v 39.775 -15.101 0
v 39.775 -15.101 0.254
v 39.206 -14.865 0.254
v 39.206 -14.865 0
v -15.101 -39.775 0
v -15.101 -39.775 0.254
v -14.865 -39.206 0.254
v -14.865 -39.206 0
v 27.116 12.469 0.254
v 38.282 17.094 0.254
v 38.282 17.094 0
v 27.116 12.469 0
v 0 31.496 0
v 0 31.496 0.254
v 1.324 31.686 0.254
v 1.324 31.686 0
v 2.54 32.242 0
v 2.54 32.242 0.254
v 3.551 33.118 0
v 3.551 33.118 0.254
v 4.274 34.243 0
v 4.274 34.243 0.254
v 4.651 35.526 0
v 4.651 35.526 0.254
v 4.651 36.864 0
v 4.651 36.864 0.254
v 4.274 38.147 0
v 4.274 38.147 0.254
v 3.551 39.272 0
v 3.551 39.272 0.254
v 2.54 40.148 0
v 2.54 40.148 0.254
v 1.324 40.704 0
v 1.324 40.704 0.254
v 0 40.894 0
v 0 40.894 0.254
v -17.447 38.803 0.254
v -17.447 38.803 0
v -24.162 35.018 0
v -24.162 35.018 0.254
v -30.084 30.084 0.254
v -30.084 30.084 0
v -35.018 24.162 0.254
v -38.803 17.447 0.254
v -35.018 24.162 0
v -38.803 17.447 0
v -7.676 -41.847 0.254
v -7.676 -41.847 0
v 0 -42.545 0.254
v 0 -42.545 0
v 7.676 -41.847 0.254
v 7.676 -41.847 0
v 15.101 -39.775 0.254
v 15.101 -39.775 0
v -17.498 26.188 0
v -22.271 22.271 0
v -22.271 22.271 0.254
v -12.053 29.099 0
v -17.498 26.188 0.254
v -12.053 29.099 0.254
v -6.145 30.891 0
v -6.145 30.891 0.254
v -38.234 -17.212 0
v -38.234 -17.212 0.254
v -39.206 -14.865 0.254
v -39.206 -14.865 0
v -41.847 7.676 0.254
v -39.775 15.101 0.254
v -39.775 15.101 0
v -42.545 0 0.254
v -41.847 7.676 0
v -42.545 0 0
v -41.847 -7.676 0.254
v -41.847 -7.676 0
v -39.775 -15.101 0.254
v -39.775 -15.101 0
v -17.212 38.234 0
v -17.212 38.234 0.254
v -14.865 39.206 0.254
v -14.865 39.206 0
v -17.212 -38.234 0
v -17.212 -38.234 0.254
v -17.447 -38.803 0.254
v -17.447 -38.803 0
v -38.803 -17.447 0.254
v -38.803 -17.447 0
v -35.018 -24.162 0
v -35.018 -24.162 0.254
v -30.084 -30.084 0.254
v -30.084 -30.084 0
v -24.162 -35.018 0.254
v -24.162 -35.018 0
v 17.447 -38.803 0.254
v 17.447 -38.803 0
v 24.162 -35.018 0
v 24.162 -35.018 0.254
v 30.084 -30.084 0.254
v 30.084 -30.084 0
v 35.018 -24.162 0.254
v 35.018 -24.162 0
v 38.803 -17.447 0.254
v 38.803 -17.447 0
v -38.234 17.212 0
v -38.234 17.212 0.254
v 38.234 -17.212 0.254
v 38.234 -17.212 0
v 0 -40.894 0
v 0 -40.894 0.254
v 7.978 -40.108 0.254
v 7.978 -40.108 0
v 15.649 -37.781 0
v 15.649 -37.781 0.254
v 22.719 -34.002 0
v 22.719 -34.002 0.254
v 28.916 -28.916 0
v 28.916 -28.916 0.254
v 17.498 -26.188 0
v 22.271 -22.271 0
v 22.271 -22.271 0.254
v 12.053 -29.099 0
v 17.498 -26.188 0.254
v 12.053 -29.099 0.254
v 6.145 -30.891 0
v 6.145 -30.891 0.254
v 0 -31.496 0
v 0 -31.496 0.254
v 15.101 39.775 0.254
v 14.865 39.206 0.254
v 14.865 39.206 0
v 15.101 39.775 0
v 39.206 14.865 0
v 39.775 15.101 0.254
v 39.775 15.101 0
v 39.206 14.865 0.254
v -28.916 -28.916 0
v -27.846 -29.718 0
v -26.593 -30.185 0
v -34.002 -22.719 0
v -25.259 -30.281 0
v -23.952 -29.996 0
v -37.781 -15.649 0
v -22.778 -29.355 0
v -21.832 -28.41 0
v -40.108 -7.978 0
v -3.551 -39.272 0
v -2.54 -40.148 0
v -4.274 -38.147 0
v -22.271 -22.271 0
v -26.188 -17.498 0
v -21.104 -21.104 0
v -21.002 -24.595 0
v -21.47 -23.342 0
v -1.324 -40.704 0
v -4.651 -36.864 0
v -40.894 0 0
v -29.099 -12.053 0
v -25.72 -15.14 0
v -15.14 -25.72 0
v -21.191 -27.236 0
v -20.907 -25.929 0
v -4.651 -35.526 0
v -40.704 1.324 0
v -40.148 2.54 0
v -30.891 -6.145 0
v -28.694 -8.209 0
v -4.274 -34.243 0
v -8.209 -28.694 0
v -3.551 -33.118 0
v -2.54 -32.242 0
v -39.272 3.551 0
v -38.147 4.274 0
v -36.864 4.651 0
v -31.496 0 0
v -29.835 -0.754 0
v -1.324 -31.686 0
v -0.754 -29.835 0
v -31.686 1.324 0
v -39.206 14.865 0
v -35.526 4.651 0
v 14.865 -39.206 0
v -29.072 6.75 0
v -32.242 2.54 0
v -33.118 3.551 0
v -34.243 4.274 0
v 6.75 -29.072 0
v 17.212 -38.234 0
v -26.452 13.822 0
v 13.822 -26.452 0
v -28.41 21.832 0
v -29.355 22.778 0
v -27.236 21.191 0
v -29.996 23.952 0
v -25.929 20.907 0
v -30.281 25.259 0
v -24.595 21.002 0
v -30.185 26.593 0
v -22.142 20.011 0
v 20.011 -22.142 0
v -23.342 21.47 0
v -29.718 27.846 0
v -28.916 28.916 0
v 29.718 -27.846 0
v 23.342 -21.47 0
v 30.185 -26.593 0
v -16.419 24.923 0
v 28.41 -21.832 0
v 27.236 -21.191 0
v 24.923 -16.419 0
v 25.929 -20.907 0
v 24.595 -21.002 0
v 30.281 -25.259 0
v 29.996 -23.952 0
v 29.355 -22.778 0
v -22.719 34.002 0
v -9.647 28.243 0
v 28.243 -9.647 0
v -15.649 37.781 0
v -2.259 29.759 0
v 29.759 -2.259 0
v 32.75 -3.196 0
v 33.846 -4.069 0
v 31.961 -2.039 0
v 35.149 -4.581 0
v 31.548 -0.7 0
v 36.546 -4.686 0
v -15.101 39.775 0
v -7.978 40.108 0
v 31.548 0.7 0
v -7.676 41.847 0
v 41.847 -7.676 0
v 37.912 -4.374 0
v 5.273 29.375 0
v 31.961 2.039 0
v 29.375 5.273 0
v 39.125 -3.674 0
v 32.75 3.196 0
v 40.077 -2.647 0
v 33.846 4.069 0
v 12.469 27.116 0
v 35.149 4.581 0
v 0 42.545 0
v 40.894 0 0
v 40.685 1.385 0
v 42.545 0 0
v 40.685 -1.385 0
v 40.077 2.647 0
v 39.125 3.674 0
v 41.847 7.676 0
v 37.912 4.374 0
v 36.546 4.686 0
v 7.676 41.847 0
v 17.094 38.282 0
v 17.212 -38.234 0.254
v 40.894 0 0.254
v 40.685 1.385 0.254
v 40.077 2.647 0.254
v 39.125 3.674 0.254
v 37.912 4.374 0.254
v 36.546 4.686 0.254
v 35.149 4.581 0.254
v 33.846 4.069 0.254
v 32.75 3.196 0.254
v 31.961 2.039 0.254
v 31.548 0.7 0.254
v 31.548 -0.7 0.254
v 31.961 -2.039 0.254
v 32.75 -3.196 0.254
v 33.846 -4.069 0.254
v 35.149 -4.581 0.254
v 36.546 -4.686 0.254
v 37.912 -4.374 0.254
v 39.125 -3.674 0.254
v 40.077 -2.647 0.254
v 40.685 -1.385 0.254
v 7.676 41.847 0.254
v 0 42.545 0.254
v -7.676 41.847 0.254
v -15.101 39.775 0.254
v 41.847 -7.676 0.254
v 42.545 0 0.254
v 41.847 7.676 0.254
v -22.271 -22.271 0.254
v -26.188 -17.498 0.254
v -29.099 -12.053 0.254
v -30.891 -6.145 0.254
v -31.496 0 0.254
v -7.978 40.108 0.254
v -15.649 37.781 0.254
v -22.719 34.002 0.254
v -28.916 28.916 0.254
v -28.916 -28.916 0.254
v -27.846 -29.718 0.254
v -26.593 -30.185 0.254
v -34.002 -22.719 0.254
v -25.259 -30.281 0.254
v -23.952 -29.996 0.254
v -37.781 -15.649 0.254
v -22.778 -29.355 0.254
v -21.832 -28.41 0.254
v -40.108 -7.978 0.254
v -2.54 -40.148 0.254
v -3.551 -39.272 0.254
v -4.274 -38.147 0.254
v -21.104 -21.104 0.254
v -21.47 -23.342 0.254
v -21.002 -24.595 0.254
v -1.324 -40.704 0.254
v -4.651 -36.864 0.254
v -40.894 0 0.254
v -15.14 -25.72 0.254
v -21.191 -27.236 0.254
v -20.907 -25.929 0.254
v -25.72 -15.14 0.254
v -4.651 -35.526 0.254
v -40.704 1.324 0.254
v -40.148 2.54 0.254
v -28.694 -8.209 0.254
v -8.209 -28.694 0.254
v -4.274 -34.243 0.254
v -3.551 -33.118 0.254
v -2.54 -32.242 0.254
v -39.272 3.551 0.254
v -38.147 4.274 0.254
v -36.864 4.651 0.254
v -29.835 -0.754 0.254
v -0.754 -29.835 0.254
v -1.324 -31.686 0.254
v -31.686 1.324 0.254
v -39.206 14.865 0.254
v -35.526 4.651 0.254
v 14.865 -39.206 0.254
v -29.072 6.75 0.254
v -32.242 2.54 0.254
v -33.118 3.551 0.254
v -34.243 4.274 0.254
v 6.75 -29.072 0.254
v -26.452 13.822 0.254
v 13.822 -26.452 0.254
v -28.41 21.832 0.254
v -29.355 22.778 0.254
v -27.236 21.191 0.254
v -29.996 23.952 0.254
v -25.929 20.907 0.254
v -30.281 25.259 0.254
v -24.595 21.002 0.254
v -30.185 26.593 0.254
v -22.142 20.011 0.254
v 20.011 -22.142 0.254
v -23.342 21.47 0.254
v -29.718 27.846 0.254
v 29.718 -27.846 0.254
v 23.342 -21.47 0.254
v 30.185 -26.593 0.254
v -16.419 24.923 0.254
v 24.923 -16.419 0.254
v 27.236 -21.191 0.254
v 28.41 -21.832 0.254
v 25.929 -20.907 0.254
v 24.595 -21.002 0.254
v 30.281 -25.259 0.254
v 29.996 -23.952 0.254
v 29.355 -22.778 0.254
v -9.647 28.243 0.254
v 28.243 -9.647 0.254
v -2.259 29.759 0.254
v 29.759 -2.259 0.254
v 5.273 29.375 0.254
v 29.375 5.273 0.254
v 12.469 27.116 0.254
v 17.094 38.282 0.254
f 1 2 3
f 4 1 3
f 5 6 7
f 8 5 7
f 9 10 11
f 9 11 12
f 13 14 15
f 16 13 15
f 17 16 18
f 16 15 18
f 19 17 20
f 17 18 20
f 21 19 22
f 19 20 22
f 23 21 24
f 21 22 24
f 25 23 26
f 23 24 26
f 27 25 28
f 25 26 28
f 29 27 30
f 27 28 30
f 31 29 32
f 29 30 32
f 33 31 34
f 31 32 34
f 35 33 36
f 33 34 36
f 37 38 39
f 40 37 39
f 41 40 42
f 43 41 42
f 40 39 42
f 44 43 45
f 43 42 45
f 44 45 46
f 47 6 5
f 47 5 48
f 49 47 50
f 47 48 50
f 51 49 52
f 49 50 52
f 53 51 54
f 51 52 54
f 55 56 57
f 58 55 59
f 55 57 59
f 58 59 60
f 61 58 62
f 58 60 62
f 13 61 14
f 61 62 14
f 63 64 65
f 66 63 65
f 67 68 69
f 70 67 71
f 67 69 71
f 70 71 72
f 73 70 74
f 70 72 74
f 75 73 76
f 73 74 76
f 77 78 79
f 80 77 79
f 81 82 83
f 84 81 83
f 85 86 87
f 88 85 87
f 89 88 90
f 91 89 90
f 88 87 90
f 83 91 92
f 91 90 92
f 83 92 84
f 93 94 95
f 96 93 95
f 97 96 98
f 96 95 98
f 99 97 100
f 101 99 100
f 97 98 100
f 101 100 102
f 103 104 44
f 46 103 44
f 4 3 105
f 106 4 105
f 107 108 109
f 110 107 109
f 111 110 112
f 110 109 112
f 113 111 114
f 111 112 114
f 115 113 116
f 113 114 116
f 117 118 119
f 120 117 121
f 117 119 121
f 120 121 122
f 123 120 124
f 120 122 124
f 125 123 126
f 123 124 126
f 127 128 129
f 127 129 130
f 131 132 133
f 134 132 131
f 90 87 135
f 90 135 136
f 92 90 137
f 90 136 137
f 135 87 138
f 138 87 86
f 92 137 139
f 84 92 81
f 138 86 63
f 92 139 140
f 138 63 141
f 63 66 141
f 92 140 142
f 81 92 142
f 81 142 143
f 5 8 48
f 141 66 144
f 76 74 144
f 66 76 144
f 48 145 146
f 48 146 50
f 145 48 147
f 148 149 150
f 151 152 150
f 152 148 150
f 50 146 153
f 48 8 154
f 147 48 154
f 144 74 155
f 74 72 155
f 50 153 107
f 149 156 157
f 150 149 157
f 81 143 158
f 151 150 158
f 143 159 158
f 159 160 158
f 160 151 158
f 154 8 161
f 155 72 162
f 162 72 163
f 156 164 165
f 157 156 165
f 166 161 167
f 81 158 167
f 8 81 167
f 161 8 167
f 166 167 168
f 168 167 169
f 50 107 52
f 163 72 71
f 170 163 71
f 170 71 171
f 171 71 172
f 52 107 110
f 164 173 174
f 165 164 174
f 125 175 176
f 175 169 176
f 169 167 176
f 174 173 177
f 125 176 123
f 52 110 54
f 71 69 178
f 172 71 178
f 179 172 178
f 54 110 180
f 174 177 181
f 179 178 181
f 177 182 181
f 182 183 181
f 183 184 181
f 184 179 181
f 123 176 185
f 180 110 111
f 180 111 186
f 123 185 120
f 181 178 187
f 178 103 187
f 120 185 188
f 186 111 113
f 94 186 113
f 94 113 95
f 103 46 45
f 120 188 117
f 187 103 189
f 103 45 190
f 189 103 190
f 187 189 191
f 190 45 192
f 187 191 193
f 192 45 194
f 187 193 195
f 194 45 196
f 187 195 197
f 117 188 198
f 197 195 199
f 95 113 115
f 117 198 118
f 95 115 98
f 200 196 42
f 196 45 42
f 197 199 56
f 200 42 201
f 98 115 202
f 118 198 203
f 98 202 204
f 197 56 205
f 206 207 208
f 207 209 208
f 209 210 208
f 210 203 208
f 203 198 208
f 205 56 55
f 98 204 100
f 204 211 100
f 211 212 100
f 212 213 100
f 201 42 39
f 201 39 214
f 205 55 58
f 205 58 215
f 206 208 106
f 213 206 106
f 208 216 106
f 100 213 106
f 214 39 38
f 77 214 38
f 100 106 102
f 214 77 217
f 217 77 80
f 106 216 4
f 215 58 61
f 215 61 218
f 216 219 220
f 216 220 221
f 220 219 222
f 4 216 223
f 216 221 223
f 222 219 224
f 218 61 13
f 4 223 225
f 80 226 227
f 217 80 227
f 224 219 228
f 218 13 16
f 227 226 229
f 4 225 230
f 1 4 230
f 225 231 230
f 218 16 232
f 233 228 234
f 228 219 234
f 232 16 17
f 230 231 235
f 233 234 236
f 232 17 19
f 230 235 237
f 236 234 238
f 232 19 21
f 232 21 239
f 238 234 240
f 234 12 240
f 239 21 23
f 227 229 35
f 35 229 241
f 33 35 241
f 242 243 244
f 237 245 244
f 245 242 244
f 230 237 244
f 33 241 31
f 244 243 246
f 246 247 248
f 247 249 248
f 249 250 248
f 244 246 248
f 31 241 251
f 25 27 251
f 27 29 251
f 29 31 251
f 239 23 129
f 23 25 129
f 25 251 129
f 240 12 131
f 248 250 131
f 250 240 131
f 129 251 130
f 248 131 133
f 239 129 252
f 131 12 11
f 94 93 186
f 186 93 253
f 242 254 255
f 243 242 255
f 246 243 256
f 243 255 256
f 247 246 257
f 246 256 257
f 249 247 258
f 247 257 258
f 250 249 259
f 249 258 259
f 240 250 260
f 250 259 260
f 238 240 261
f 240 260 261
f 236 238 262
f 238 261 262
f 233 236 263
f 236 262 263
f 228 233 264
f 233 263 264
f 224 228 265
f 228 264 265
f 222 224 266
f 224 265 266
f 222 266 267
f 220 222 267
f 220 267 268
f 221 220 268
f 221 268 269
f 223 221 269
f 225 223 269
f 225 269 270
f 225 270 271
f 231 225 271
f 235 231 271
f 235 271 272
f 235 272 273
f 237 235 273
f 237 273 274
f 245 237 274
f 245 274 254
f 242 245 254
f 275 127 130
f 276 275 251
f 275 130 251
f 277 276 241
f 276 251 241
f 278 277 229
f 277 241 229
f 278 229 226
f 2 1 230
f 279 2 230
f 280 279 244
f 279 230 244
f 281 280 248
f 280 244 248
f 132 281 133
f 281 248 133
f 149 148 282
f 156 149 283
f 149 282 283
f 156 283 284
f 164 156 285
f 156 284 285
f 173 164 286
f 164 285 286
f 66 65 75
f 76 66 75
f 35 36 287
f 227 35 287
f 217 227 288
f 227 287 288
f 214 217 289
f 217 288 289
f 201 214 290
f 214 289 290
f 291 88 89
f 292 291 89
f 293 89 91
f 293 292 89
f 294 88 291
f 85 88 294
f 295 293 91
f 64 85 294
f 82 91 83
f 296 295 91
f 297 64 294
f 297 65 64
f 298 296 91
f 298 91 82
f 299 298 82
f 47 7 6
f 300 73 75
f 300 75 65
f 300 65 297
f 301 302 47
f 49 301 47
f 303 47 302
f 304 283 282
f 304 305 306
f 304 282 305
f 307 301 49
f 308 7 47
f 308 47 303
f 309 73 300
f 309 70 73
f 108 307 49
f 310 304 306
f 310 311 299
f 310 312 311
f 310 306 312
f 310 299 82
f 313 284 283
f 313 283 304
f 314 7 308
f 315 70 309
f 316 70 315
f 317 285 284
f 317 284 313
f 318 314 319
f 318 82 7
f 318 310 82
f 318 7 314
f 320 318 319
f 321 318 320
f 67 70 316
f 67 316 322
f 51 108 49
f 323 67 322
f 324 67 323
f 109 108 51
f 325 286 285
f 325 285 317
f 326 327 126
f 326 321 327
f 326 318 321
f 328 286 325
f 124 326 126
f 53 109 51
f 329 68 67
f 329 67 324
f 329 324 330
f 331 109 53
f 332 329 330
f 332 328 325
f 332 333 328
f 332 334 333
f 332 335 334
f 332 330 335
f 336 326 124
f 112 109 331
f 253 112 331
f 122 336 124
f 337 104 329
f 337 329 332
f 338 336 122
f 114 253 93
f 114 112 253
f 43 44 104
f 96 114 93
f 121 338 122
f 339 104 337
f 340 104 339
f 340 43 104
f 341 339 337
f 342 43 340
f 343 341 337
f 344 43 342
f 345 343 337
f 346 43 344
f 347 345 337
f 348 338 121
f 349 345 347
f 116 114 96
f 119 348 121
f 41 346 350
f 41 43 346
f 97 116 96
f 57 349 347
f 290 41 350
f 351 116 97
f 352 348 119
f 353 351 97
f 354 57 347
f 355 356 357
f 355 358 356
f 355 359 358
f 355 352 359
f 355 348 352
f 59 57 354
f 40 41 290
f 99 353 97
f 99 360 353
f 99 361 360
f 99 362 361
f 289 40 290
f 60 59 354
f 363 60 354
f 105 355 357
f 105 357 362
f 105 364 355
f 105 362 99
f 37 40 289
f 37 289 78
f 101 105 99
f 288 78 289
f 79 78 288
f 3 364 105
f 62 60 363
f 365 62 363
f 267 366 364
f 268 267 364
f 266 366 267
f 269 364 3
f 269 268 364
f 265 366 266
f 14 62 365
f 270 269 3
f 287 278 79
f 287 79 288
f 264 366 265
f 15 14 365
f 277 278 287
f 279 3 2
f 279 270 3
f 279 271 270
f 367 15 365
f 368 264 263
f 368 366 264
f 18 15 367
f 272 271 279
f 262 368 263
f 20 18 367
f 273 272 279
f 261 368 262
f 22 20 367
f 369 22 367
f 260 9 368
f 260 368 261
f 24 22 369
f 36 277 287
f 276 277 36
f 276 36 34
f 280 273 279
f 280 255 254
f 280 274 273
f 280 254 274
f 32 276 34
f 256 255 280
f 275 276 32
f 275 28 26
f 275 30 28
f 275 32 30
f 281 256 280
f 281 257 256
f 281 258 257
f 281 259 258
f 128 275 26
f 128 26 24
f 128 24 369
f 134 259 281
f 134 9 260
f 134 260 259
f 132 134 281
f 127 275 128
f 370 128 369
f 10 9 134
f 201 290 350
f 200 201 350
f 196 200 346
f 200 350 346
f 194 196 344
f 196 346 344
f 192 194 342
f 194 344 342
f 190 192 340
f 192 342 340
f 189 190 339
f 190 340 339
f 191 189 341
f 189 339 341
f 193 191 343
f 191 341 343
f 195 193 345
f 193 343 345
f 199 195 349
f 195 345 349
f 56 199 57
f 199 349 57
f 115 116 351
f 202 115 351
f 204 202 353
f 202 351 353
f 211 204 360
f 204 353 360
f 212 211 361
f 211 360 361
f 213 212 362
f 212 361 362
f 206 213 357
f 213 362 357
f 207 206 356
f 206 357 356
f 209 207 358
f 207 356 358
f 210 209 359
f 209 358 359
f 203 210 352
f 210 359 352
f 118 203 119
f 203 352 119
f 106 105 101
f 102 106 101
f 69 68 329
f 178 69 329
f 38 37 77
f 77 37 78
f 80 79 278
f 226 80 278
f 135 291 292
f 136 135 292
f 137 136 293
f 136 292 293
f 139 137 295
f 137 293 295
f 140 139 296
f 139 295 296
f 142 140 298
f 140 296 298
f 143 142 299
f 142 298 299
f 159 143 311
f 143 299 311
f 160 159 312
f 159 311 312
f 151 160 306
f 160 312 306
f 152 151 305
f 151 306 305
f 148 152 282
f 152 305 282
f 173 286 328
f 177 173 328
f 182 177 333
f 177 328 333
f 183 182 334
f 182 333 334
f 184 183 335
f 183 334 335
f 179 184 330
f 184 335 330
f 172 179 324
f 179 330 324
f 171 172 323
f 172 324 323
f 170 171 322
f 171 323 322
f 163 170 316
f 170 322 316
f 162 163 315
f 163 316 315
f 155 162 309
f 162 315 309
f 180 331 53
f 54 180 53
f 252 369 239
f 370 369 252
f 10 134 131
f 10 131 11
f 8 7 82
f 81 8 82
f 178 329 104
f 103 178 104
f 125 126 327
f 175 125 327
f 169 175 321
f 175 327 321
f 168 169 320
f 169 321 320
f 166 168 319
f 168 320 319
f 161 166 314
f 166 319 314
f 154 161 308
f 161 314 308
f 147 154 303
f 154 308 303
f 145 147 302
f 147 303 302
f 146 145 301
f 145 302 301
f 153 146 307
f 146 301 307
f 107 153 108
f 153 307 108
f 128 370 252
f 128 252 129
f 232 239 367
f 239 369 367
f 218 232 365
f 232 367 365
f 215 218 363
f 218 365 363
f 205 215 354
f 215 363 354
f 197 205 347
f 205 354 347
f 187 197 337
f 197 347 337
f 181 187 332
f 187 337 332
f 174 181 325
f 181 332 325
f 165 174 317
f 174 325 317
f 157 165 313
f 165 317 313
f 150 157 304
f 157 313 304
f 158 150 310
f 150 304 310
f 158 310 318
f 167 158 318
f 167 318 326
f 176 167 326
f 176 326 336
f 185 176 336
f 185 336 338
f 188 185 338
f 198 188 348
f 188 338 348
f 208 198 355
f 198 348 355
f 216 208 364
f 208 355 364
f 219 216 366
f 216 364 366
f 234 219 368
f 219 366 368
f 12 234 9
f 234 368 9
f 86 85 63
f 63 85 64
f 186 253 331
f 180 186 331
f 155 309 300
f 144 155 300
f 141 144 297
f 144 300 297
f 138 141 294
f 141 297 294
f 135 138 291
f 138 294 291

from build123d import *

# Parameters (mm, degrees)
SKETCH4_R           = 42.545
BOSS_EXTRUDE2_DEPTH = 0.254
SKETCH5_R           = 29.845
CUT_EXTRUDE5_DEPTH  = 1.254
SKETCH6_R           = 4.699
CUT_EXTRUDE6_DEPTH  = 1.254
CUT_EXTRUDE11_DEPTH = 1.254


with BuildPart() as part:
    # Sketch4 → Boss-Extrude2 (new body)
    with BuildSketch(Plane.XY):
        Circle(SKETCH4_R)
    extrude(amount=BOSS_EXTRUDE2_DEPTH)

    # Sketch5 → Cut-Extrude5 (cut, through all)
    with BuildSketch(Plane.XY.offset(0.254)):
        Circle(SKETCH5_R)
    extrude(amount=-CUT_EXTRUDE5_DEPTH, mode=Mode.SUBTRACT)

    # Sketch6 → Cut-Extrude6 (cut, through all)
    with BuildSketch(Plane.XY.offset(0.254)):
        with Locations((36.195, 0)):
            Circle(SKETCH6_R)
        with BuildLine():
            ThreePointArc((28.916424148, -28.916425271), (28.916424774, -22.271035245), (22.271034748, -22.271035613))
            ThreePointArc((22.271034748, -22.271035613), (12.052997339, -29.098509775), (5.1e-07, -31.496))
            ThreePointArc((5.1e-07, -31.496), (-4.699, -36.195000076), (6.62e-07, -40.894))
            ThreePointArc((6.62e-07, -40.894), (15.649456222, -37.781129628), (28.916424148, -28.916425271))
        make_face()
        with BuildLine():
            ThreePointArc((-28.916425271, -28.916424148), (-22.271035245, -28.916424774), (-22.271035613, -22.271034748))
            ThreePointArc((-22.271035613, -22.271034748), (-29.098509775, -12.052997339), (-31.496, -5.1e-07))
            ThreePointArc((-31.496, -5.1e-07), (-36.195000076, 4.699), (-40.894, -6.62e-07))
            ThreePointArc((-40.894, -6.62e-07), (-37.781129628, -15.649456222), (-28.916425271, -28.916424148))
        make_face()
        with BuildLine():
            ThreePointArc((-28.916424148, 28.916425271), (-28.916424774, 22.271035245), (-22.271034748, 22.271035613))
            ThreePointArc((-22.271034748, 22.271035613), (-12.052997339, 29.098509775), (-5.1e-07, 31.496))
            ThreePointArc((-5.1e-07, 31.496), (4.699, 36.195000076), (-6.62e-07, 40.894))
            ThreePointArc((-6.62e-07, 40.894), (-15.649456222, 37.781129628), (-28.916424148, 28.916425271))
        make_face()
    extrude(amount=-CUT_EXTRUDE6_DEPTH, mode=Mode.SUBTRACT)

    # Sketch8 → Cut-Extrude11 (cut, through all)
    with BuildSketch(Plane.XY.offset(0.254)):
        with BuildLine():
            Line((39.205799167, 14.864935644), (38.282384044, 17.094256956))
            Line((38.282384044, 17.094256956), (27.115548897, 12.468802389))
            ThreePointArc((27.115548897, 12.468802389), (21.103601885, 21.103601885), (12.468802389, 27.115548897))
            Line((12.468802389, 27.115548897), (17.094256956, 38.282384044))
            Line((17.094256956, 38.282384044), (14.864935644, 39.205799167))
            Line((14.864935644, 39.205799167), (15.107939624, 39.79246267))
            Line((15.107939624, 39.79246267), (16.28126663, 39.306454711))
            ThreePointArc((16.28126663, 39.306454711), (30.083858006, 30.083858006), (39.306454711, 16.28126663))
            Line((39.306454711, 16.28126663), (39.79246267, 15.107939624))
            Line((39.79246267, 15.107939624), (39.205799167, 14.864935644))
        make_face()
        Polygon((-15.350943603, 40.379126173), (-17.697597616, 39.407110255), (-17.211589657, 38.233783248), (-14.864935644, 39.205799167), align=None)
        Polygon((-39.407110255, 17.697597616), (-40.379126173, 15.350943603), (-39.205799167, 14.864935644), (-38.233783248, 17.211589657), align=None)
        Polygon((-40.379126173, -15.350943603), (-39.407110255, -17.697597616), (-38.233783248, -17.211589657), (-39.205799167, -14.864935644), align=None)
        Polygon((-17.697597616, -39.407110255), (-15.350943603, -40.379126173), (-14.864935644, -39.205799167), (-17.211589657, -38.233783248), align=None)
        Polygon((15.350943603, -40.379126173), (17.697597616, -39.407110255), (17.211589657, -38.233783248), (14.864935644, -39.205799167), align=None)
        Polygon((39.407110255, -17.697597616), (40.379126173, -15.350943603), (39.205799167, -14.864935644), (38.233783248, -17.211589657), align=None)
    extrude(amount=-CUT_EXTRUDE11_DEPTH, mode=Mode.SUBTRACT)


solid = part.part
